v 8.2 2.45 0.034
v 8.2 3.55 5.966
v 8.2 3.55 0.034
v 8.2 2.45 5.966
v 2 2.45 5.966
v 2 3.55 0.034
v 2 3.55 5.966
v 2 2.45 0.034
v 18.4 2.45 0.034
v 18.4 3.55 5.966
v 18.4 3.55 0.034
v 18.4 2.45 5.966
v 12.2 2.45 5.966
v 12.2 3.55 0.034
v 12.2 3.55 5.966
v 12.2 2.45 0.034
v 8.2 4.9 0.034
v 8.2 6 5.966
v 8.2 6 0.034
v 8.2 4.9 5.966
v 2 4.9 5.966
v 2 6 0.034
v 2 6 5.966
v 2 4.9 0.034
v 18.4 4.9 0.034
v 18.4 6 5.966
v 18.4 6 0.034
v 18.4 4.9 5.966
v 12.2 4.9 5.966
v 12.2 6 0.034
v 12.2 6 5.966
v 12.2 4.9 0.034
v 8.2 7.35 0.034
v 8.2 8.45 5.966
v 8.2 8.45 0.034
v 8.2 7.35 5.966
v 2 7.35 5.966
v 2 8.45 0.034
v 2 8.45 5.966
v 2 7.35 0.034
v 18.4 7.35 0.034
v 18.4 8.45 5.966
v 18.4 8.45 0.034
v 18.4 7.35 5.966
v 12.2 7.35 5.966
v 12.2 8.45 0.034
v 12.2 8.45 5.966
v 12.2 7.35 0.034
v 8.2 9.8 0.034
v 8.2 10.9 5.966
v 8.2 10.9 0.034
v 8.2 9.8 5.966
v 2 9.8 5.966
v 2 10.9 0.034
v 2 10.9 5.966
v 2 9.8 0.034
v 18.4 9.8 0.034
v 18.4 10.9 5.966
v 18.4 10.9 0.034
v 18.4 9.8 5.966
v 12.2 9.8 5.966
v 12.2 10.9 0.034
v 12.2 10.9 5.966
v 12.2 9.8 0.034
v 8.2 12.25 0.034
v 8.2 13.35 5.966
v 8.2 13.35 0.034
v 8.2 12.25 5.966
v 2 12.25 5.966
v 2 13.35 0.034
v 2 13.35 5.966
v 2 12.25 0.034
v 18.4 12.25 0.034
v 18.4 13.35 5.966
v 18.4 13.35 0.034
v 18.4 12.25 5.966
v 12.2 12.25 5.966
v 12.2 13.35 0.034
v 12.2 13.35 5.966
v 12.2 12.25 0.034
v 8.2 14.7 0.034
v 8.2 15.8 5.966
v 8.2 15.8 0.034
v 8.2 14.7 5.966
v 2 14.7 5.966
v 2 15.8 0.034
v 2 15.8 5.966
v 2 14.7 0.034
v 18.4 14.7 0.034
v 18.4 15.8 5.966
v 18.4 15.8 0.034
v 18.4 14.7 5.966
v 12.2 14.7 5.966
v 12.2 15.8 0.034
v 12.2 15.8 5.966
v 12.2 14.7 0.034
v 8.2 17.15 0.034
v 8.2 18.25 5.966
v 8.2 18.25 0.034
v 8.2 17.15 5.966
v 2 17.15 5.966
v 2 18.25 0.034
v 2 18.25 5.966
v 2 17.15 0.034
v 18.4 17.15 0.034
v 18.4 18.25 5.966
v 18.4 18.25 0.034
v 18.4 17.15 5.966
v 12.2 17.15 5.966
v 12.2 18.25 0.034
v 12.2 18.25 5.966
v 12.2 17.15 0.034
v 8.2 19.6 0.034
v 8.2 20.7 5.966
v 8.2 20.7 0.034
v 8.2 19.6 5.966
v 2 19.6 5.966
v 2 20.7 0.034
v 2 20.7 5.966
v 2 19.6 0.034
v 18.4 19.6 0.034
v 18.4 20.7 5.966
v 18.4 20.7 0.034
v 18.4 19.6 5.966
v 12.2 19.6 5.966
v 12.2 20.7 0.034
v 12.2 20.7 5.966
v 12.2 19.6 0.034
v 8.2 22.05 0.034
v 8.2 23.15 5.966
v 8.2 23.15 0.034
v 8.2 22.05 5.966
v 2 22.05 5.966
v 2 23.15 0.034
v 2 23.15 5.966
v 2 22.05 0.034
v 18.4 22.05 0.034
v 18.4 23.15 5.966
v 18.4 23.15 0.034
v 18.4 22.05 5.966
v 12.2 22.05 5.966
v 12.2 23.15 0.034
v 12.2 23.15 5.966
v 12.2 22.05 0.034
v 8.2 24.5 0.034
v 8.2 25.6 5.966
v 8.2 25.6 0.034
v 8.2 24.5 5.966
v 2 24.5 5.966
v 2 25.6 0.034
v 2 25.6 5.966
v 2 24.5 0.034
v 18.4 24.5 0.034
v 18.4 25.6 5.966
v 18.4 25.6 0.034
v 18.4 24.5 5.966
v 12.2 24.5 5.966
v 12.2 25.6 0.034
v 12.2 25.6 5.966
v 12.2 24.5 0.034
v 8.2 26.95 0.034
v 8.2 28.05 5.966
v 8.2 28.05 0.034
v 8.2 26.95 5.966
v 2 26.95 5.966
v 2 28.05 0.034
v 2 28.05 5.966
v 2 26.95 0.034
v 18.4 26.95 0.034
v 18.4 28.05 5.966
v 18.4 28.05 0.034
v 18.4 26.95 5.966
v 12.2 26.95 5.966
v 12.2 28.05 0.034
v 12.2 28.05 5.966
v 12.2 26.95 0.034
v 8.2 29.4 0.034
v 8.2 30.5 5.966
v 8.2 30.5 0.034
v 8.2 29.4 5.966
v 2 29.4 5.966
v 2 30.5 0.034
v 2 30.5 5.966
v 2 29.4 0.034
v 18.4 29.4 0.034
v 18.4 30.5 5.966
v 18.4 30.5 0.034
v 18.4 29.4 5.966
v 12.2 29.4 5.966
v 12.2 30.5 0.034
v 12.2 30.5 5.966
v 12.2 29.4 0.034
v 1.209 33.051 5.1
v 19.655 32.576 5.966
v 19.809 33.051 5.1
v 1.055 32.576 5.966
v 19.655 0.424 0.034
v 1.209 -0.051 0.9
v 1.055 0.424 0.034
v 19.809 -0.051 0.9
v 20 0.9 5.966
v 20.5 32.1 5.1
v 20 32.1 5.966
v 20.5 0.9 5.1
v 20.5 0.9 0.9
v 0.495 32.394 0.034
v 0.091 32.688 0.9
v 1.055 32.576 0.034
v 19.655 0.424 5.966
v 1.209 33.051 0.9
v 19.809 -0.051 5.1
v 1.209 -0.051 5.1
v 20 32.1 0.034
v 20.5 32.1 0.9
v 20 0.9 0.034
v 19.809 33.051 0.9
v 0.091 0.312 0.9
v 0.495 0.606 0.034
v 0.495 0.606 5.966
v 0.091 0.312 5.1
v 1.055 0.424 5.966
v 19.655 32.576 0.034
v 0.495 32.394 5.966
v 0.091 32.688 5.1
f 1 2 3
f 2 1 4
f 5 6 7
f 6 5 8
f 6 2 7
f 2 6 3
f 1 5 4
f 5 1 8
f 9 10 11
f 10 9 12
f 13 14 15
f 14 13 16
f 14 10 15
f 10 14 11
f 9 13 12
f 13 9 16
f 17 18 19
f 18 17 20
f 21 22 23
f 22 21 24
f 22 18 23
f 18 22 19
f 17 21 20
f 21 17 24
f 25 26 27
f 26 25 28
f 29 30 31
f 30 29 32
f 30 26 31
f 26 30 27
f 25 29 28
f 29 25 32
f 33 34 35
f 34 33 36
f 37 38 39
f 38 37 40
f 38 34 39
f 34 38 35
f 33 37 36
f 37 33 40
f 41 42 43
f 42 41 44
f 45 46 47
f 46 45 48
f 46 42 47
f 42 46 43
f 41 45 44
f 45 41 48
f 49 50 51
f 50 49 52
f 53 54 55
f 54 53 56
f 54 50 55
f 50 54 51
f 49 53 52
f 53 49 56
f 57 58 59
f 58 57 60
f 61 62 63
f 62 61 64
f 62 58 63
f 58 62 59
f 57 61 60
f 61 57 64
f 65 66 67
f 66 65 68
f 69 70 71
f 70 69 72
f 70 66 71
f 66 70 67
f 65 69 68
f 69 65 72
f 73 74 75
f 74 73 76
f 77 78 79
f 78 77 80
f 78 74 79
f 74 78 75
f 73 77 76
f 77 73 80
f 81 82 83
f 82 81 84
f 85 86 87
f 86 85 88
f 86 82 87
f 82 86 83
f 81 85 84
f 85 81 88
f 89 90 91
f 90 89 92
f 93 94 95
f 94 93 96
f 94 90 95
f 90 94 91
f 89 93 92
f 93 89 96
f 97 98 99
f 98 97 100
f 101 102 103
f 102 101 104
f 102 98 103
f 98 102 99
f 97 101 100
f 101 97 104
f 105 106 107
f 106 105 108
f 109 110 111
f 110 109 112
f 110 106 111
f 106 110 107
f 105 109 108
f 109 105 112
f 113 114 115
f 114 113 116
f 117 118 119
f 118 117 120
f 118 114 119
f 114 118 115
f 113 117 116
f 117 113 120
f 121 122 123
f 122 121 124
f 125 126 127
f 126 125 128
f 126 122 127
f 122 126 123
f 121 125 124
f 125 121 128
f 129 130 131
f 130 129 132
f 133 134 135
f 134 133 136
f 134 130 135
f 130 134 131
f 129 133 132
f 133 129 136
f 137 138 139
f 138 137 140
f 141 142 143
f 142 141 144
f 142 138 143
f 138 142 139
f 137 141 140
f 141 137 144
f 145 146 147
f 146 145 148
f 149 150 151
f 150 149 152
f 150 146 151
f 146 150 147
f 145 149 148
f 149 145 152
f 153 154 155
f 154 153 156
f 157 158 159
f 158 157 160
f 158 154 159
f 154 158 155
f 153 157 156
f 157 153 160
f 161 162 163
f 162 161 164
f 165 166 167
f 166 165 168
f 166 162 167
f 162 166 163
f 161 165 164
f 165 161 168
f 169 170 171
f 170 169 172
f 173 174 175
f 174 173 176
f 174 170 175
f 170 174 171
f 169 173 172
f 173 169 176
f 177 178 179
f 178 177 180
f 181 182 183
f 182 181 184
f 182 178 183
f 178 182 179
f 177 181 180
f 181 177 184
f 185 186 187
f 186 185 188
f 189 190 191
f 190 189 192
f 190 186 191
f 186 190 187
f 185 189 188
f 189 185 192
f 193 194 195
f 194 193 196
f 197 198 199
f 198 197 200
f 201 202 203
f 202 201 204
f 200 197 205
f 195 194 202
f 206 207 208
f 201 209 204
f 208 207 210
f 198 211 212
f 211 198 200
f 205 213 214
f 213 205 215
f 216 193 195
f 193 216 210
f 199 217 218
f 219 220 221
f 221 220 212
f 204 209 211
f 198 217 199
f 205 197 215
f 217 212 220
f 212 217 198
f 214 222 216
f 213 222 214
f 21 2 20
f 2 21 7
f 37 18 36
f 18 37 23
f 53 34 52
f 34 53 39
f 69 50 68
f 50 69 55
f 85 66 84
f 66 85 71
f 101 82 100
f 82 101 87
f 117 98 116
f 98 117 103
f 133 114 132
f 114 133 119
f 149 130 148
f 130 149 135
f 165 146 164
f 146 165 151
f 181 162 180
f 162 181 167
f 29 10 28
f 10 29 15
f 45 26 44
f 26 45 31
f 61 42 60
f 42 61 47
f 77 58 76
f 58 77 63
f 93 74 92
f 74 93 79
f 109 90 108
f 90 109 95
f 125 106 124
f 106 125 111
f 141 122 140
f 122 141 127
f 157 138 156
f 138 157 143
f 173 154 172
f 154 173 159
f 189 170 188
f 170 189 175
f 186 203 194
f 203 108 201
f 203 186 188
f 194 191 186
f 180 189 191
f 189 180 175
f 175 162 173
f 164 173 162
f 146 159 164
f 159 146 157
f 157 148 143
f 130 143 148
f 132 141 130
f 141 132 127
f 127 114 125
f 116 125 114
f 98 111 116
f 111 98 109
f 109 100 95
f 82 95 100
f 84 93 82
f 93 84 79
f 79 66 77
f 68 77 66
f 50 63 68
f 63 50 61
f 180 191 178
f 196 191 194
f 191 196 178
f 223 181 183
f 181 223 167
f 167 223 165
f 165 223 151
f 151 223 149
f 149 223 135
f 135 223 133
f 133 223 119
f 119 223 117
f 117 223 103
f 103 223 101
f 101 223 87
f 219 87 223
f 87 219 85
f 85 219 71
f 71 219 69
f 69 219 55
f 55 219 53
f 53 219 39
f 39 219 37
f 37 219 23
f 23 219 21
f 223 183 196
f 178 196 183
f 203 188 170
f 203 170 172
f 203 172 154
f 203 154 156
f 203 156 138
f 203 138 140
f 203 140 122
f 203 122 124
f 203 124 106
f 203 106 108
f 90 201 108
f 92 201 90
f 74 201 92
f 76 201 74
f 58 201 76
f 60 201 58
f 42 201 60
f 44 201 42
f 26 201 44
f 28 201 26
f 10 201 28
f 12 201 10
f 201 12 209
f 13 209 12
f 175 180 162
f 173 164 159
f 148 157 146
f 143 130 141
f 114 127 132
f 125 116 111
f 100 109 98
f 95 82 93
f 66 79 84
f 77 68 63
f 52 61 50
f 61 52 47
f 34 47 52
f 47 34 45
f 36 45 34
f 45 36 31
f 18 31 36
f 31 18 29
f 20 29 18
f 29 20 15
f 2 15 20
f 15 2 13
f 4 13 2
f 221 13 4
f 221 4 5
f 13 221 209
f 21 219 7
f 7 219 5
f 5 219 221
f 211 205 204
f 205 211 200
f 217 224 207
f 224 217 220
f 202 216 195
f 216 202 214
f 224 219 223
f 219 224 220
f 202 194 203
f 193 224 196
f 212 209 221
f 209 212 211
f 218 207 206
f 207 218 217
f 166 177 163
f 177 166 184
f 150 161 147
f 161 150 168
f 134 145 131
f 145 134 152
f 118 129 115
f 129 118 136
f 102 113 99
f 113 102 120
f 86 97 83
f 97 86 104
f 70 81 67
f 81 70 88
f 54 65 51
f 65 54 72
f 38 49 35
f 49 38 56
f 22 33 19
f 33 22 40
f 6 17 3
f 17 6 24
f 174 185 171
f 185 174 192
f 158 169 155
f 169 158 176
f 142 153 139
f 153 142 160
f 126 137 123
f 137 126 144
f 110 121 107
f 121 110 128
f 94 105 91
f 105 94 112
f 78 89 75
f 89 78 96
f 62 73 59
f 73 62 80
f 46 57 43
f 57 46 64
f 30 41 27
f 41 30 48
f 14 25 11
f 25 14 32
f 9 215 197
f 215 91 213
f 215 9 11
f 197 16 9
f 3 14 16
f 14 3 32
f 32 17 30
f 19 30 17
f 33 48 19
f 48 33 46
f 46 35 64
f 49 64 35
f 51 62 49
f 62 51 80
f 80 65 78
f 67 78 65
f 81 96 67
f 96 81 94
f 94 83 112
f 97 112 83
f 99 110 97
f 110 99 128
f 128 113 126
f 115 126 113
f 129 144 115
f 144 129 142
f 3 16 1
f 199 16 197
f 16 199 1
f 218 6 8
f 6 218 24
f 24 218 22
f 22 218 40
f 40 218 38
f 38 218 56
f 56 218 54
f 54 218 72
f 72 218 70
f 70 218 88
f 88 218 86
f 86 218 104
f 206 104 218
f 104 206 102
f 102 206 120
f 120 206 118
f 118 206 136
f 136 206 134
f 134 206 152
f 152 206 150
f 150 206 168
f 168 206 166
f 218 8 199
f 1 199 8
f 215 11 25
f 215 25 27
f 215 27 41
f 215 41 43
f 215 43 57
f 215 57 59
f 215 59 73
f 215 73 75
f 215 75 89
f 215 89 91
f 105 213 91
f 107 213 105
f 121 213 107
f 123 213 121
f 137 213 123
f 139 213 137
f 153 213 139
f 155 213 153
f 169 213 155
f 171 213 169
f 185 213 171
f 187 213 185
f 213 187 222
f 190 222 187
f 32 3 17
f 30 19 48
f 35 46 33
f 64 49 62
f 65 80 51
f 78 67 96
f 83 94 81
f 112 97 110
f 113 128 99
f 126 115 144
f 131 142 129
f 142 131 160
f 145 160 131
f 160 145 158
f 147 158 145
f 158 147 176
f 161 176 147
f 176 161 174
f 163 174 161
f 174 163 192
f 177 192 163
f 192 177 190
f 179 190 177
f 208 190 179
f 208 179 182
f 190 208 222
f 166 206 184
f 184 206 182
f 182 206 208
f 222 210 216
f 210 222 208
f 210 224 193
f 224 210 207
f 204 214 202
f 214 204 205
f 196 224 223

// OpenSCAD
iter=12;
gapY=3;
fuseTol=0.6;
fuseGapX=2;
fuseGap=4;
fuseWidth=5+(fuseTol*2);
fuseH=6;
fuseWeight=0.5+fuseTol;


xMax=fuseGapX*2+fuseGap+fuseWidth*2;
yMax=(iter-1)*gapY;
zMax=fuseH;

//xMax=xMax-1;
//yMax=yMax-1;
//zMax=zMax-1;



difference(){
    

    
  //cube(size = [fuseGapX*2+fuseGap+fuseWidth*2,(iter+1)*gapY,fuseH]);
  roundedCube(xMax,yMax,zMax);

  translate([fuseGapX,,0])
  union(){
    for(i = [1 : iter]){ 
        translate([0,i*(gapY-(fuseWeight/2)),0])union(){
          cube(size = [fuseWidth,fuseWeight,fuseH]);
          translate([fuseWidth+fuseGap,0,0]) cube(size = [fuseWidth,fuseWeight,fuseH]);
        }
    }
  }
}

module roundedCube(x,y,z){
        tol = 1.8;
        x=x-tol;
        y=y-tol;
        z=z-tol;
        translate([tol/2,tol/2,tol/2])
        hull(){
        translate([0,0,0]) sphere();
        translate([x,0,0]) sphere();
        translate([x,y,0]) sphere();
        translate([0,y,0]) sphere();
        
        translate([0,0,z]) sphere();
        translate([x,0,z]) sphere();
        translate([x,y,z]) sphere();
        translate([0,y,z]) sphere();
        /*
        for(x=[1,5]){
            for(y=[1,5]){
                for(z=[1,5]){
                    translate([x*xMax,y*yMax,z*zMax]) sphere();
                }
            }
         }
         */
    }
}


  
